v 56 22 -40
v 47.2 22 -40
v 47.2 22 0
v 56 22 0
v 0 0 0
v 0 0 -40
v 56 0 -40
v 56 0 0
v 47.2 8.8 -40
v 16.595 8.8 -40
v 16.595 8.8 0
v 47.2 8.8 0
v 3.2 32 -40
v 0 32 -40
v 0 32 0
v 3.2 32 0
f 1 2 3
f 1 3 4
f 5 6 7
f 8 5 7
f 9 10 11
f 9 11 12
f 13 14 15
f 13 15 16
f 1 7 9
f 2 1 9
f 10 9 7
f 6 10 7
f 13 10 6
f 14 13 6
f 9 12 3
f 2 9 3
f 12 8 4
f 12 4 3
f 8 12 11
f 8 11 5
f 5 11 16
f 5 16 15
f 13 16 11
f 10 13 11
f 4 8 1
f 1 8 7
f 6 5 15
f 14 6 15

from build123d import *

# Parameters (mm, degrees)
SKETCH_4_W      = 56
SKETCH_4_H      = 40
EXTRUDE_2_DEPTH = 8.8
SKETCH_5_W      = 8.8
SKETCH_5_H      = 13.2
EXTRUDE_3_DEPTH = 40


with BuildPart() as part:
    # 스케치4 → 보스-돌출2 (new body)
    with BuildSketch(Plane(origin=(0, 0, 0), x_dir=(1, 0, 0), z_dir=(0, 1, 0))):
        with Locations((28, 20)):
            Rectangle(SKETCH_4_W, SKETCH_4_H)
    extrude(amount=EXTRUDE_2_DEPTH)

    # 스케치5 → 보스-돌출3 (add)
    with BuildSketch(Plane.XY):
        Polygon((0, 8.8), (0, 32), (3.2, 32), (16.594526245, 8.8), align=None)
        with Locations((51.6, 15.4)):
            Rectangle(SKETCH_5_W, SKETCH_5_H)
    extrude(amount=-EXTRUDE_3_DEPTH)


solid = part.part
